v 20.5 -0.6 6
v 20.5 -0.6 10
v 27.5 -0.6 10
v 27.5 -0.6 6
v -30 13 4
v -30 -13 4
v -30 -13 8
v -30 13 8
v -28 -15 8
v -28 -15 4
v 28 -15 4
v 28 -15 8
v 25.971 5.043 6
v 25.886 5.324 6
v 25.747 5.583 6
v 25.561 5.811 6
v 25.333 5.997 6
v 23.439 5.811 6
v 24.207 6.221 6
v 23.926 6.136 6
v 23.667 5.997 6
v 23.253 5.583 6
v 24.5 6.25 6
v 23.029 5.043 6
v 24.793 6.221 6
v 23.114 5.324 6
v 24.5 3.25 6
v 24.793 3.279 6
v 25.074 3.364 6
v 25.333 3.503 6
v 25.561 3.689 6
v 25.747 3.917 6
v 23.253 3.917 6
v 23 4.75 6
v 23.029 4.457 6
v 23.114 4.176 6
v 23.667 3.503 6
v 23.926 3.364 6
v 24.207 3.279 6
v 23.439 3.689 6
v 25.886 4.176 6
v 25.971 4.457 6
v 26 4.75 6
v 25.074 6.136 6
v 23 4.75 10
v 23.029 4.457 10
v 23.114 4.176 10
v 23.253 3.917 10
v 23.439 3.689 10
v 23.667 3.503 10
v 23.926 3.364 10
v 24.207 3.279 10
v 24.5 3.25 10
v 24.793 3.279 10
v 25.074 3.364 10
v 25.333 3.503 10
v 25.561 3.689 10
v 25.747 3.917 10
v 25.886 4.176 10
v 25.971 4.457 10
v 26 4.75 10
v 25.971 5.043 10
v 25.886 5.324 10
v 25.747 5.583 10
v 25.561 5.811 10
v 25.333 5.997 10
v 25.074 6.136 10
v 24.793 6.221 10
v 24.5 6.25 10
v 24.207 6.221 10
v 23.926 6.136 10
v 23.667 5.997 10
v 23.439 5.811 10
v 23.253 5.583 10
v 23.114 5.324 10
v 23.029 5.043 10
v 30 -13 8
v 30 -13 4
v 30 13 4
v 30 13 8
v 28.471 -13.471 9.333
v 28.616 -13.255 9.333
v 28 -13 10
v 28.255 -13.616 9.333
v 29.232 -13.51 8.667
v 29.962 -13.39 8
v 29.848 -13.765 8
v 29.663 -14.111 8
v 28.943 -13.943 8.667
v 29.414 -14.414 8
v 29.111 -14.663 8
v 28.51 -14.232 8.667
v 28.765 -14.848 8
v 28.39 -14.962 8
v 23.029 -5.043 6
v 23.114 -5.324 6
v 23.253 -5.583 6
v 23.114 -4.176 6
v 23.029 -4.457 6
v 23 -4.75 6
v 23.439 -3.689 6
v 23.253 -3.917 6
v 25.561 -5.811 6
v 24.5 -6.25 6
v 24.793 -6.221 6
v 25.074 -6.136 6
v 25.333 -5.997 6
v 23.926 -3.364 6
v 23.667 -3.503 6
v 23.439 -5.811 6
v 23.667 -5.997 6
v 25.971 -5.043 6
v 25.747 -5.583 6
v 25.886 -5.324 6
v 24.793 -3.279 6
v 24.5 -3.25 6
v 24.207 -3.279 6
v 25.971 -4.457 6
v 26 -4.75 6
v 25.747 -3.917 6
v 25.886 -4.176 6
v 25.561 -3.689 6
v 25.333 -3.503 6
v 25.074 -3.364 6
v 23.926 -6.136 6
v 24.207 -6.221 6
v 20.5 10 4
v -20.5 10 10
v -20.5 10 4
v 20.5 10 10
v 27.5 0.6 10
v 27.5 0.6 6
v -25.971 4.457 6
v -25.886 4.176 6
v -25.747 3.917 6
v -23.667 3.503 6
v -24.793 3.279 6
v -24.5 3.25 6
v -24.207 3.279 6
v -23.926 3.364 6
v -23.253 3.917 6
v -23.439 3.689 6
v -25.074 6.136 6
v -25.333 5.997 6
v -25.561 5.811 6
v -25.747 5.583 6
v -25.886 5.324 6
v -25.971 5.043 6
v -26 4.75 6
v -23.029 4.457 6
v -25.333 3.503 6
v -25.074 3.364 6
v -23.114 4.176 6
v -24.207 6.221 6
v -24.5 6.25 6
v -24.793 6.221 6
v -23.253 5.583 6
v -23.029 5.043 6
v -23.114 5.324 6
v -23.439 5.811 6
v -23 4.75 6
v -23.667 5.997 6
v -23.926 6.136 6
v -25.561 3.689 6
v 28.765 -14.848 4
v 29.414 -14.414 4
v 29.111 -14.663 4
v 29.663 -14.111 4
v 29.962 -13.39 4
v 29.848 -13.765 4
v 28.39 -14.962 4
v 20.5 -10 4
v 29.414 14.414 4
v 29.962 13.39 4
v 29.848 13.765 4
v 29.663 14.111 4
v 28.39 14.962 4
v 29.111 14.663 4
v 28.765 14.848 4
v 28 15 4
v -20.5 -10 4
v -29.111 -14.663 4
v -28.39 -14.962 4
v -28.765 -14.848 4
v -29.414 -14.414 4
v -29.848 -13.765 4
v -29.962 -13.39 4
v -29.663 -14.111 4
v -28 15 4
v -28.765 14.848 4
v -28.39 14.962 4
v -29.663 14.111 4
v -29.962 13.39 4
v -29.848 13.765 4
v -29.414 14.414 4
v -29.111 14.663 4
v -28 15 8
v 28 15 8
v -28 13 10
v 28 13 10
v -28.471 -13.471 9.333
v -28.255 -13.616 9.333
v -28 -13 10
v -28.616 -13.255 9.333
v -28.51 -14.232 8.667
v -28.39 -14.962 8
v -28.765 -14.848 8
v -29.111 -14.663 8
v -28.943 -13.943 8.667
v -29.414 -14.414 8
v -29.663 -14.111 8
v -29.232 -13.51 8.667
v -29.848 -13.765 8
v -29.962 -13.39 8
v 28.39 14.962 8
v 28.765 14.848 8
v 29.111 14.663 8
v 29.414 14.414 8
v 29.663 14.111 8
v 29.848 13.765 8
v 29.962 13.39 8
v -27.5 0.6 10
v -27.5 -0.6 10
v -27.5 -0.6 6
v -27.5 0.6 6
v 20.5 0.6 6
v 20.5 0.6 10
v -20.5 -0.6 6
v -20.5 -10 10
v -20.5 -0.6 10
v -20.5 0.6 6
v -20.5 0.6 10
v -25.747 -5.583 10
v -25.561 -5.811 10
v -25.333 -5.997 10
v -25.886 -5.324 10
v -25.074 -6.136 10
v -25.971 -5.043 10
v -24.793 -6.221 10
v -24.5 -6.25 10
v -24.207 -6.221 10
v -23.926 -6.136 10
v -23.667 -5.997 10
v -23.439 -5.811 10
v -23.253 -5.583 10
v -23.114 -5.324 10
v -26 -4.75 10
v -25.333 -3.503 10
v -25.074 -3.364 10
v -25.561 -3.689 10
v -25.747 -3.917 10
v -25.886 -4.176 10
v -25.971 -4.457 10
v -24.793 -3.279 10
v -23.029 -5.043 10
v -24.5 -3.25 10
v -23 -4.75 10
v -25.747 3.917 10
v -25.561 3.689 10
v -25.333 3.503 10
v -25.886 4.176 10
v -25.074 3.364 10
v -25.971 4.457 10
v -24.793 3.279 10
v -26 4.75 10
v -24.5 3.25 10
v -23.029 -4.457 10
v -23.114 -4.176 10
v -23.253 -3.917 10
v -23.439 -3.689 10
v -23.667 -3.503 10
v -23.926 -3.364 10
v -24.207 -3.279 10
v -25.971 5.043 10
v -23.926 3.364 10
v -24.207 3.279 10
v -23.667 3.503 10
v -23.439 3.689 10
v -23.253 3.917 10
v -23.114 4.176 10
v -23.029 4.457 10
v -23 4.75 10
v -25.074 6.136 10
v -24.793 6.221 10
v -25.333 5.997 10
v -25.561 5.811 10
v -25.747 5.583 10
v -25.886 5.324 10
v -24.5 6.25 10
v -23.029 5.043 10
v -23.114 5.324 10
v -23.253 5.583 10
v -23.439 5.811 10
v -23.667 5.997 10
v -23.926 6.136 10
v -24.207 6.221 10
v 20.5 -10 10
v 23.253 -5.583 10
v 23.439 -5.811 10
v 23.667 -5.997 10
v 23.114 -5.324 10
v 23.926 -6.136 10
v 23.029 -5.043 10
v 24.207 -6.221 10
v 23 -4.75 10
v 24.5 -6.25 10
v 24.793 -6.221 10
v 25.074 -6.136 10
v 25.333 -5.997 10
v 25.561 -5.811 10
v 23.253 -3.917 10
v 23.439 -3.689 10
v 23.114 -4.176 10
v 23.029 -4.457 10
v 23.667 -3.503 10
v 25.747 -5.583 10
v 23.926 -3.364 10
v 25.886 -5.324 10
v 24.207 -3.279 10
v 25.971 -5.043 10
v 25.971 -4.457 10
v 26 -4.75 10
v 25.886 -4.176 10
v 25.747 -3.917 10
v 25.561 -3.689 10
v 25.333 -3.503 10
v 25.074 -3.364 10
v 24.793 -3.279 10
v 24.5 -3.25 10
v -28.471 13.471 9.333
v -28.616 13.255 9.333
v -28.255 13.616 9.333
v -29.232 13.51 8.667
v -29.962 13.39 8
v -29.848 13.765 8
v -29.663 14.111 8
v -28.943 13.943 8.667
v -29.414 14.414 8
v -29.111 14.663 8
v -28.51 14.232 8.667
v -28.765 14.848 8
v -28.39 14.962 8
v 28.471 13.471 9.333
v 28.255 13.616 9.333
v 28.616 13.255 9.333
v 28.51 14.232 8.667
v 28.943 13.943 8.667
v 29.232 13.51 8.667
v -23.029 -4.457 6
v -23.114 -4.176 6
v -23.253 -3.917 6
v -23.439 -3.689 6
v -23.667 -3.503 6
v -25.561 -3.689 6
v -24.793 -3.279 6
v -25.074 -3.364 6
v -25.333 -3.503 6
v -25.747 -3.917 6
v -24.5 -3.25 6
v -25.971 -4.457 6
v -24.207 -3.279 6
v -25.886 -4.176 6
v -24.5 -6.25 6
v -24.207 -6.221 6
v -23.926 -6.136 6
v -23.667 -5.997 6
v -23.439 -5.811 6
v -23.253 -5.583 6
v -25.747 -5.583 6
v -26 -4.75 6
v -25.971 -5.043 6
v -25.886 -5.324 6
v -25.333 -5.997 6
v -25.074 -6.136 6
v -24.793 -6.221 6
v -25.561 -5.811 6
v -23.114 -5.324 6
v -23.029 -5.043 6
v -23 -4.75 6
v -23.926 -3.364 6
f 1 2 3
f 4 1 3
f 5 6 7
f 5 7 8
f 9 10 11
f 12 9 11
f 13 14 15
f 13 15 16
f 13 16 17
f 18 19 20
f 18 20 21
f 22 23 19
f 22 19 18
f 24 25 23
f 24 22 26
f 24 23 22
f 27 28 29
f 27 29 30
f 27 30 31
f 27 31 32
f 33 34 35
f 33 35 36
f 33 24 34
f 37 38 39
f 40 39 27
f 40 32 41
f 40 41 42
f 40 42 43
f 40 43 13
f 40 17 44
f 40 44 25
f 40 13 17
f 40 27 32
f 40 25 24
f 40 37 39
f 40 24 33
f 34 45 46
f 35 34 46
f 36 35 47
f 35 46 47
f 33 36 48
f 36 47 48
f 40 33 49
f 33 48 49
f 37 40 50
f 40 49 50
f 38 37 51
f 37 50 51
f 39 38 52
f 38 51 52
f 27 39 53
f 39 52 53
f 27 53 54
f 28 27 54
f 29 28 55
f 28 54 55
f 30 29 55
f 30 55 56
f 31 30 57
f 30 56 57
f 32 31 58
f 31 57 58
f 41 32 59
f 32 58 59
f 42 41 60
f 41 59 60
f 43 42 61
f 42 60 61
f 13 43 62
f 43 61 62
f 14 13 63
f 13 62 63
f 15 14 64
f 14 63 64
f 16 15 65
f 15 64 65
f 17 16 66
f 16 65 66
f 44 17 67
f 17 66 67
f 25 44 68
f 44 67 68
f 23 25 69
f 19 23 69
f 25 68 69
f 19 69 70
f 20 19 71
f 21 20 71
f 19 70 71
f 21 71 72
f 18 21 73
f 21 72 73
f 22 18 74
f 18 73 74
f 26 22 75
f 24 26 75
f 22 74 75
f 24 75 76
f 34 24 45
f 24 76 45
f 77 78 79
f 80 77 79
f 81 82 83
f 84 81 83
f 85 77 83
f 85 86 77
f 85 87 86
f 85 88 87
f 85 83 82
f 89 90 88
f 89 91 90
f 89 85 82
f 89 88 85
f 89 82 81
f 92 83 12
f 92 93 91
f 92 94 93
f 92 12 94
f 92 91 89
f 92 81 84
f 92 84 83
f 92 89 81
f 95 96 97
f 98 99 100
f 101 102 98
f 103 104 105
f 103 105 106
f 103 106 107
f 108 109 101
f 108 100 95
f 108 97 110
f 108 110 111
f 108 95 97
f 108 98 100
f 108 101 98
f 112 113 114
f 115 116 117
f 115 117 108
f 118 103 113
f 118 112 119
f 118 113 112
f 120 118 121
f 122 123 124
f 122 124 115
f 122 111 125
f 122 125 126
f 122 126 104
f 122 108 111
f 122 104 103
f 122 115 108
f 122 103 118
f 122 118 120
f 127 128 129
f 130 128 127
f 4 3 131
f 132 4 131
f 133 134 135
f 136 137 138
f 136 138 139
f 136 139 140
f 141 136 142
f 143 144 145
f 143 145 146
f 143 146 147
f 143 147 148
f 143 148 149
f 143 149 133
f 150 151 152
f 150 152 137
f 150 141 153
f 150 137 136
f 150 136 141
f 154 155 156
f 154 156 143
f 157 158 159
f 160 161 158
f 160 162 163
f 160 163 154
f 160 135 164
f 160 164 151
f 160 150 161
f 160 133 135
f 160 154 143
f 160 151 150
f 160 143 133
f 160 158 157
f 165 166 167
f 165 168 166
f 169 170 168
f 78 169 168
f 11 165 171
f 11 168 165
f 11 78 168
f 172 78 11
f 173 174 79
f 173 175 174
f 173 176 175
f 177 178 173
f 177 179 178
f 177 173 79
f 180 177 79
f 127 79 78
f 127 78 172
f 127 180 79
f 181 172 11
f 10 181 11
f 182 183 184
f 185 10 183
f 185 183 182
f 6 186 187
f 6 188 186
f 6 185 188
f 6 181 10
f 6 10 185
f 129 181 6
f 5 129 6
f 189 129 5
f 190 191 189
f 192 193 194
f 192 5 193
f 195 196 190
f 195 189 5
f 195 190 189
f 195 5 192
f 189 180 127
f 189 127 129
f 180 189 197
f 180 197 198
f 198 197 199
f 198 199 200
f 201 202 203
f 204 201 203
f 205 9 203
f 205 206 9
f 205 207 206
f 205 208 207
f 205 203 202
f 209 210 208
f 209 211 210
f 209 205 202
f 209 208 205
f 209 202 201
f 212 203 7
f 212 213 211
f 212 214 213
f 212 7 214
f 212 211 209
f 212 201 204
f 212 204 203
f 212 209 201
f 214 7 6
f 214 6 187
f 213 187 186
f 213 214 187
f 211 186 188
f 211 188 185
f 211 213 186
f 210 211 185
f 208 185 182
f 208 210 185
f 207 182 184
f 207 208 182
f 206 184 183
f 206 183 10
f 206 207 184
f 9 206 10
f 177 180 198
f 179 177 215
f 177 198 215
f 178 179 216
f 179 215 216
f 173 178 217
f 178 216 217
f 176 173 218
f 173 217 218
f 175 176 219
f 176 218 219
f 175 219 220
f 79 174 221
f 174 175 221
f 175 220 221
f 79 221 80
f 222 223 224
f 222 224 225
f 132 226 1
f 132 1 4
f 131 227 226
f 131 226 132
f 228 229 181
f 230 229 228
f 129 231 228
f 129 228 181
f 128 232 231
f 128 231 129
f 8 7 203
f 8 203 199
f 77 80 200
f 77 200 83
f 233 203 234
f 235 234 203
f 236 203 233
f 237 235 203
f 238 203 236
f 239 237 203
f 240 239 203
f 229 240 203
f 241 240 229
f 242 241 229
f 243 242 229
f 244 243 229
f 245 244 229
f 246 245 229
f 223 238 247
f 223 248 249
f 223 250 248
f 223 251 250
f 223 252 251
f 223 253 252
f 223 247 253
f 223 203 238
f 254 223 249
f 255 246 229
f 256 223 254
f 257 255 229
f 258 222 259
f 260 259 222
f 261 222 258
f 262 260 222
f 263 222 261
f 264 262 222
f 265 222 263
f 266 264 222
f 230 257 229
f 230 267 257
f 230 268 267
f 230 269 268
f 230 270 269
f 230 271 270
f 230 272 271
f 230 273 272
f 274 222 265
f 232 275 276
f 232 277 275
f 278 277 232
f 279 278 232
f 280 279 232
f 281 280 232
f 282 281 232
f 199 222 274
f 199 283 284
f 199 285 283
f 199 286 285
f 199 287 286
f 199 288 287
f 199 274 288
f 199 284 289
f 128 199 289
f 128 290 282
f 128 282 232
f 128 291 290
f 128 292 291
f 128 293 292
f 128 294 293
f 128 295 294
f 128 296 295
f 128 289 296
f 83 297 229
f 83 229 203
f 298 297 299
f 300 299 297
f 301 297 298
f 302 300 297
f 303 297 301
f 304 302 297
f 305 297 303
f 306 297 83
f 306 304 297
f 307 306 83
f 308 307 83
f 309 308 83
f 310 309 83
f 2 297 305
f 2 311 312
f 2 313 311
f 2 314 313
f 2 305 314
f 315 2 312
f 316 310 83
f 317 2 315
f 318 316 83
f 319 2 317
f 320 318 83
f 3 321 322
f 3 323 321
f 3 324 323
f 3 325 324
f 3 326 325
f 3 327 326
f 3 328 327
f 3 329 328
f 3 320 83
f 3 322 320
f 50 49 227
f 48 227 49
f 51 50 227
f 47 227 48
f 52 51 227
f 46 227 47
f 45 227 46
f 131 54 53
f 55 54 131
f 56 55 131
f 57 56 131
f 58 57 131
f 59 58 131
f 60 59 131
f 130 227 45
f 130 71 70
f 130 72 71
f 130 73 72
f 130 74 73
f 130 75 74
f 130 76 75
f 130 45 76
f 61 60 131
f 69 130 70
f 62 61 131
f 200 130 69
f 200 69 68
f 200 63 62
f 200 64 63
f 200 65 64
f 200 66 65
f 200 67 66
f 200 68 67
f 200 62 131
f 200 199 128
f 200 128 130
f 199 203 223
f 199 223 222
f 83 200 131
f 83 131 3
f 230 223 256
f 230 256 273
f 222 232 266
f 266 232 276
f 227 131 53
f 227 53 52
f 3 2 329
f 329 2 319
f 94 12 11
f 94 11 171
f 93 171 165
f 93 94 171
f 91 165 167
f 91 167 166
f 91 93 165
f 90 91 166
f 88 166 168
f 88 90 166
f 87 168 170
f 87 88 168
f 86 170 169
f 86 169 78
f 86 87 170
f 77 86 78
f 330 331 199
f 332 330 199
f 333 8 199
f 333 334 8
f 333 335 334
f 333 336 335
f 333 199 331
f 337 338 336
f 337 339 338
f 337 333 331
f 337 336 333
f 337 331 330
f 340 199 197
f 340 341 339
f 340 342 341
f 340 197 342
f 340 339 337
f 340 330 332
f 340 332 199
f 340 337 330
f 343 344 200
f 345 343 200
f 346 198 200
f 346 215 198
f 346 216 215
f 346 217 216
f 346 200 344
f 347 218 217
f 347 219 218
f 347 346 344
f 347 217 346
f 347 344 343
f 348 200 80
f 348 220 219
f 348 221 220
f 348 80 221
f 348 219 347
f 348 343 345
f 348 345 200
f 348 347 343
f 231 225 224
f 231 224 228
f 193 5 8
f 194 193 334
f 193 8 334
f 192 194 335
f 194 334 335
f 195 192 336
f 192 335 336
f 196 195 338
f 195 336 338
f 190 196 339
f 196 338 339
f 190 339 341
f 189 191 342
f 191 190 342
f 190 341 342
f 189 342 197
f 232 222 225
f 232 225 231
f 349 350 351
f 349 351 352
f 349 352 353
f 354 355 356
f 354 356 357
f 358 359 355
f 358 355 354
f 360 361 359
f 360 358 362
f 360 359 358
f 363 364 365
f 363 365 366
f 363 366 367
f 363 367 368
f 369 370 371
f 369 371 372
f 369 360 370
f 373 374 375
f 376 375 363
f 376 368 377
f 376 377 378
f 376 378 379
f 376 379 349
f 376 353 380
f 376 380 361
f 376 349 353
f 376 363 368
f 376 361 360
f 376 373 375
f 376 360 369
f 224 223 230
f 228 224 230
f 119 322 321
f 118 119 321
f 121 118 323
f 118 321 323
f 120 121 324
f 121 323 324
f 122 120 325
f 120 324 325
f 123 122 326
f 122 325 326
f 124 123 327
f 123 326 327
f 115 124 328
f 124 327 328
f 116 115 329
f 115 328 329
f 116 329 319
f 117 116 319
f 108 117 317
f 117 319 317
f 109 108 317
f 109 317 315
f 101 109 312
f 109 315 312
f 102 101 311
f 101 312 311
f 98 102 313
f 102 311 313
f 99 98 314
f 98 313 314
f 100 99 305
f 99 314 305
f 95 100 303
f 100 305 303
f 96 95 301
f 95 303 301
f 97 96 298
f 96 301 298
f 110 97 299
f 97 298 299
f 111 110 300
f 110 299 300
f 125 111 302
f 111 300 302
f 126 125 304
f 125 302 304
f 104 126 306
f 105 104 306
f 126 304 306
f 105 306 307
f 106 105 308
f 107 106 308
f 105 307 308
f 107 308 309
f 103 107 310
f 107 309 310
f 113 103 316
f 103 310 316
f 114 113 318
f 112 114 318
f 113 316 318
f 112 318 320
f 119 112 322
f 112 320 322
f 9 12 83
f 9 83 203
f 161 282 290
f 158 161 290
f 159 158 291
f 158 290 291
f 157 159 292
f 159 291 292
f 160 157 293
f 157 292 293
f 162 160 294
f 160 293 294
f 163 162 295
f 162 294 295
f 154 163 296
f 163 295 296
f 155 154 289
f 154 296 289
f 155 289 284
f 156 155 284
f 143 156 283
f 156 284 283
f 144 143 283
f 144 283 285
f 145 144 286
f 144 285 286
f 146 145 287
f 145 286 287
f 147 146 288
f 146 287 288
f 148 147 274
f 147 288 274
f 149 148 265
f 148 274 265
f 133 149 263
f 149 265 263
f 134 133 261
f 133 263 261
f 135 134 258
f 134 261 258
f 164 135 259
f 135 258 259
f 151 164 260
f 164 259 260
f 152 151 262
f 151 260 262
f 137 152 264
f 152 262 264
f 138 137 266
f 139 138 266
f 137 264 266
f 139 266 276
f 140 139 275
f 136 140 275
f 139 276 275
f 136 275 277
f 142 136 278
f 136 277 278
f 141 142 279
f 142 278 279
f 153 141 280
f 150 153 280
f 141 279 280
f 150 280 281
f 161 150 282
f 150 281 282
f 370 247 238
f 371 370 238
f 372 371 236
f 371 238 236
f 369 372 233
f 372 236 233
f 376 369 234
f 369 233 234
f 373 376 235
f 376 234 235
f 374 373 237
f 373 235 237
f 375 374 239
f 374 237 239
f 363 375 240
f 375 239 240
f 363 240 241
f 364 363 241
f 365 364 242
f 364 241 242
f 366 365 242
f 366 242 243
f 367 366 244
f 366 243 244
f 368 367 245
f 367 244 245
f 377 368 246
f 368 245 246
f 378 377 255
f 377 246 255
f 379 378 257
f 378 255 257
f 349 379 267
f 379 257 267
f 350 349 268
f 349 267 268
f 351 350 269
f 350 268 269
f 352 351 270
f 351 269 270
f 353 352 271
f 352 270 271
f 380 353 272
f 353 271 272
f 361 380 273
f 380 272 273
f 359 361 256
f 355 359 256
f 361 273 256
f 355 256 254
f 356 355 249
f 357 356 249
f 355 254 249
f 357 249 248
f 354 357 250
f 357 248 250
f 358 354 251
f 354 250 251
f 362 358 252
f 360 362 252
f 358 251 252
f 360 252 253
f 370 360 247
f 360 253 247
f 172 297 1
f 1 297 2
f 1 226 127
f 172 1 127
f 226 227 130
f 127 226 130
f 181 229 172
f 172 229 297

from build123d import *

# Parameters (mm, degrees)
SKETCH1_W           = 60
SKETCH1_H           = 30
BOSS_EXTRUDE1_DEPTH = 10
SKETCH2_W           = 41
SKETCH2_H           = 20
CUT_EXTRUDE1_DEPTH  = 10
SKETCH3_R           = 1.5
SKETCH3_W           = 14
SKETCH3_H           = 1.2
CUT_EXTRUDE2_DEPTH  = 4
FILLET1_R           = 2
CHAMFER1_SIZE       = 2
SKETCH5_W           = 145.508726569
SKETCH5_H           = 79.029504781
CUT_EXTRUDE3_DEPTH  = 4


with BuildPart() as part:
    # Sketch1 → Boss-Extrude1 (new body)
    with BuildSketch(Plane.XY):
        Rectangle(SKETCH1_W, SKETCH1_H)
    extrude(amount=BOSS_EXTRUDE1_DEPTH)

    # Sketch2 → Cut-Extrude1 (cut)
    with BuildSketch(Plane.XY.offset(10)):
        Rectangle(SKETCH2_W, SKETCH2_H)
    extrude(amount=-CUT_EXTRUDE1_DEPTH, mode=Mode.SUBTRACT)

    # Sketch3 → Cut-Extrude2 (cut)
    with BuildSketch(Plane.XY.offset(10)):
        with Locations((-24.5, 4.75)):
            Circle(SKETCH3_R)
        with Locations(Location((-24.5, -4.75, 0), (0, 0, 180))):
            Circle(SKETCH3_R)
        with Locations((24.5, -4.75)):
            Circle(SKETCH3_R)
        with Locations(Location((24.5, 4.75, 0), (0, 0, 180))):
            Circle(SKETCH3_R)
        with Locations((-20.5, 0)):
            Rectangle(SKETCH3_W, SKETCH3_H)
        with Locations((20.5, 0)):
            Rectangle(SKETCH3_W, SKETCH3_H)
    extrude(amount=-CUT_EXTRUDE2_DEPTH, mode=Mode.SUBTRACT)

    # Fillet1
    fillet1_edges = [part.edges().sort_by_distance(p)[0] for p in [
        (30, -15, 5),
        (-30, -15, 5),
        (-30, 15, 5),
        (30, 15, 5),
    ]]
    fillet(fillet1_edges, radius=FILLET1_R)

    # Chamfer1
    chamfer1_edges = [part.edges().sort_by_distance(p)[0] for p in [
        (0, 15, 10),
        (30, 0, 10),
        (-30, 0, 10),
        (0, -15, 10),
        (-29.414213562, 14.414213562, 10),
        (-29.414213562, -14.414213562, 10),
        (29.414213562, -14.414213562, 10),
        (29.414213562, 14.414213562, 10),
    ]]
    chamfer(chamfer1_edges, length=CHAMFER1_SIZE - 0.0001)  # a hair under: the kernel refuses the full size

    # Sketch5 → Cut-Extrude3 (cut)
    with BuildSketch(Plane(origin=(0, 0, 0), x_dir=(-1, 0, 0), z_dir=(0, 0, -1))):
        with Locations((-37.961499545, 20.658262846)):
            Rectangle(SKETCH5_W, SKETCH5_H)
    extrude(amount=-CUT_EXTRUDE3_DEPTH, mode=Mode.SUBTRACT)


solid = part.part
